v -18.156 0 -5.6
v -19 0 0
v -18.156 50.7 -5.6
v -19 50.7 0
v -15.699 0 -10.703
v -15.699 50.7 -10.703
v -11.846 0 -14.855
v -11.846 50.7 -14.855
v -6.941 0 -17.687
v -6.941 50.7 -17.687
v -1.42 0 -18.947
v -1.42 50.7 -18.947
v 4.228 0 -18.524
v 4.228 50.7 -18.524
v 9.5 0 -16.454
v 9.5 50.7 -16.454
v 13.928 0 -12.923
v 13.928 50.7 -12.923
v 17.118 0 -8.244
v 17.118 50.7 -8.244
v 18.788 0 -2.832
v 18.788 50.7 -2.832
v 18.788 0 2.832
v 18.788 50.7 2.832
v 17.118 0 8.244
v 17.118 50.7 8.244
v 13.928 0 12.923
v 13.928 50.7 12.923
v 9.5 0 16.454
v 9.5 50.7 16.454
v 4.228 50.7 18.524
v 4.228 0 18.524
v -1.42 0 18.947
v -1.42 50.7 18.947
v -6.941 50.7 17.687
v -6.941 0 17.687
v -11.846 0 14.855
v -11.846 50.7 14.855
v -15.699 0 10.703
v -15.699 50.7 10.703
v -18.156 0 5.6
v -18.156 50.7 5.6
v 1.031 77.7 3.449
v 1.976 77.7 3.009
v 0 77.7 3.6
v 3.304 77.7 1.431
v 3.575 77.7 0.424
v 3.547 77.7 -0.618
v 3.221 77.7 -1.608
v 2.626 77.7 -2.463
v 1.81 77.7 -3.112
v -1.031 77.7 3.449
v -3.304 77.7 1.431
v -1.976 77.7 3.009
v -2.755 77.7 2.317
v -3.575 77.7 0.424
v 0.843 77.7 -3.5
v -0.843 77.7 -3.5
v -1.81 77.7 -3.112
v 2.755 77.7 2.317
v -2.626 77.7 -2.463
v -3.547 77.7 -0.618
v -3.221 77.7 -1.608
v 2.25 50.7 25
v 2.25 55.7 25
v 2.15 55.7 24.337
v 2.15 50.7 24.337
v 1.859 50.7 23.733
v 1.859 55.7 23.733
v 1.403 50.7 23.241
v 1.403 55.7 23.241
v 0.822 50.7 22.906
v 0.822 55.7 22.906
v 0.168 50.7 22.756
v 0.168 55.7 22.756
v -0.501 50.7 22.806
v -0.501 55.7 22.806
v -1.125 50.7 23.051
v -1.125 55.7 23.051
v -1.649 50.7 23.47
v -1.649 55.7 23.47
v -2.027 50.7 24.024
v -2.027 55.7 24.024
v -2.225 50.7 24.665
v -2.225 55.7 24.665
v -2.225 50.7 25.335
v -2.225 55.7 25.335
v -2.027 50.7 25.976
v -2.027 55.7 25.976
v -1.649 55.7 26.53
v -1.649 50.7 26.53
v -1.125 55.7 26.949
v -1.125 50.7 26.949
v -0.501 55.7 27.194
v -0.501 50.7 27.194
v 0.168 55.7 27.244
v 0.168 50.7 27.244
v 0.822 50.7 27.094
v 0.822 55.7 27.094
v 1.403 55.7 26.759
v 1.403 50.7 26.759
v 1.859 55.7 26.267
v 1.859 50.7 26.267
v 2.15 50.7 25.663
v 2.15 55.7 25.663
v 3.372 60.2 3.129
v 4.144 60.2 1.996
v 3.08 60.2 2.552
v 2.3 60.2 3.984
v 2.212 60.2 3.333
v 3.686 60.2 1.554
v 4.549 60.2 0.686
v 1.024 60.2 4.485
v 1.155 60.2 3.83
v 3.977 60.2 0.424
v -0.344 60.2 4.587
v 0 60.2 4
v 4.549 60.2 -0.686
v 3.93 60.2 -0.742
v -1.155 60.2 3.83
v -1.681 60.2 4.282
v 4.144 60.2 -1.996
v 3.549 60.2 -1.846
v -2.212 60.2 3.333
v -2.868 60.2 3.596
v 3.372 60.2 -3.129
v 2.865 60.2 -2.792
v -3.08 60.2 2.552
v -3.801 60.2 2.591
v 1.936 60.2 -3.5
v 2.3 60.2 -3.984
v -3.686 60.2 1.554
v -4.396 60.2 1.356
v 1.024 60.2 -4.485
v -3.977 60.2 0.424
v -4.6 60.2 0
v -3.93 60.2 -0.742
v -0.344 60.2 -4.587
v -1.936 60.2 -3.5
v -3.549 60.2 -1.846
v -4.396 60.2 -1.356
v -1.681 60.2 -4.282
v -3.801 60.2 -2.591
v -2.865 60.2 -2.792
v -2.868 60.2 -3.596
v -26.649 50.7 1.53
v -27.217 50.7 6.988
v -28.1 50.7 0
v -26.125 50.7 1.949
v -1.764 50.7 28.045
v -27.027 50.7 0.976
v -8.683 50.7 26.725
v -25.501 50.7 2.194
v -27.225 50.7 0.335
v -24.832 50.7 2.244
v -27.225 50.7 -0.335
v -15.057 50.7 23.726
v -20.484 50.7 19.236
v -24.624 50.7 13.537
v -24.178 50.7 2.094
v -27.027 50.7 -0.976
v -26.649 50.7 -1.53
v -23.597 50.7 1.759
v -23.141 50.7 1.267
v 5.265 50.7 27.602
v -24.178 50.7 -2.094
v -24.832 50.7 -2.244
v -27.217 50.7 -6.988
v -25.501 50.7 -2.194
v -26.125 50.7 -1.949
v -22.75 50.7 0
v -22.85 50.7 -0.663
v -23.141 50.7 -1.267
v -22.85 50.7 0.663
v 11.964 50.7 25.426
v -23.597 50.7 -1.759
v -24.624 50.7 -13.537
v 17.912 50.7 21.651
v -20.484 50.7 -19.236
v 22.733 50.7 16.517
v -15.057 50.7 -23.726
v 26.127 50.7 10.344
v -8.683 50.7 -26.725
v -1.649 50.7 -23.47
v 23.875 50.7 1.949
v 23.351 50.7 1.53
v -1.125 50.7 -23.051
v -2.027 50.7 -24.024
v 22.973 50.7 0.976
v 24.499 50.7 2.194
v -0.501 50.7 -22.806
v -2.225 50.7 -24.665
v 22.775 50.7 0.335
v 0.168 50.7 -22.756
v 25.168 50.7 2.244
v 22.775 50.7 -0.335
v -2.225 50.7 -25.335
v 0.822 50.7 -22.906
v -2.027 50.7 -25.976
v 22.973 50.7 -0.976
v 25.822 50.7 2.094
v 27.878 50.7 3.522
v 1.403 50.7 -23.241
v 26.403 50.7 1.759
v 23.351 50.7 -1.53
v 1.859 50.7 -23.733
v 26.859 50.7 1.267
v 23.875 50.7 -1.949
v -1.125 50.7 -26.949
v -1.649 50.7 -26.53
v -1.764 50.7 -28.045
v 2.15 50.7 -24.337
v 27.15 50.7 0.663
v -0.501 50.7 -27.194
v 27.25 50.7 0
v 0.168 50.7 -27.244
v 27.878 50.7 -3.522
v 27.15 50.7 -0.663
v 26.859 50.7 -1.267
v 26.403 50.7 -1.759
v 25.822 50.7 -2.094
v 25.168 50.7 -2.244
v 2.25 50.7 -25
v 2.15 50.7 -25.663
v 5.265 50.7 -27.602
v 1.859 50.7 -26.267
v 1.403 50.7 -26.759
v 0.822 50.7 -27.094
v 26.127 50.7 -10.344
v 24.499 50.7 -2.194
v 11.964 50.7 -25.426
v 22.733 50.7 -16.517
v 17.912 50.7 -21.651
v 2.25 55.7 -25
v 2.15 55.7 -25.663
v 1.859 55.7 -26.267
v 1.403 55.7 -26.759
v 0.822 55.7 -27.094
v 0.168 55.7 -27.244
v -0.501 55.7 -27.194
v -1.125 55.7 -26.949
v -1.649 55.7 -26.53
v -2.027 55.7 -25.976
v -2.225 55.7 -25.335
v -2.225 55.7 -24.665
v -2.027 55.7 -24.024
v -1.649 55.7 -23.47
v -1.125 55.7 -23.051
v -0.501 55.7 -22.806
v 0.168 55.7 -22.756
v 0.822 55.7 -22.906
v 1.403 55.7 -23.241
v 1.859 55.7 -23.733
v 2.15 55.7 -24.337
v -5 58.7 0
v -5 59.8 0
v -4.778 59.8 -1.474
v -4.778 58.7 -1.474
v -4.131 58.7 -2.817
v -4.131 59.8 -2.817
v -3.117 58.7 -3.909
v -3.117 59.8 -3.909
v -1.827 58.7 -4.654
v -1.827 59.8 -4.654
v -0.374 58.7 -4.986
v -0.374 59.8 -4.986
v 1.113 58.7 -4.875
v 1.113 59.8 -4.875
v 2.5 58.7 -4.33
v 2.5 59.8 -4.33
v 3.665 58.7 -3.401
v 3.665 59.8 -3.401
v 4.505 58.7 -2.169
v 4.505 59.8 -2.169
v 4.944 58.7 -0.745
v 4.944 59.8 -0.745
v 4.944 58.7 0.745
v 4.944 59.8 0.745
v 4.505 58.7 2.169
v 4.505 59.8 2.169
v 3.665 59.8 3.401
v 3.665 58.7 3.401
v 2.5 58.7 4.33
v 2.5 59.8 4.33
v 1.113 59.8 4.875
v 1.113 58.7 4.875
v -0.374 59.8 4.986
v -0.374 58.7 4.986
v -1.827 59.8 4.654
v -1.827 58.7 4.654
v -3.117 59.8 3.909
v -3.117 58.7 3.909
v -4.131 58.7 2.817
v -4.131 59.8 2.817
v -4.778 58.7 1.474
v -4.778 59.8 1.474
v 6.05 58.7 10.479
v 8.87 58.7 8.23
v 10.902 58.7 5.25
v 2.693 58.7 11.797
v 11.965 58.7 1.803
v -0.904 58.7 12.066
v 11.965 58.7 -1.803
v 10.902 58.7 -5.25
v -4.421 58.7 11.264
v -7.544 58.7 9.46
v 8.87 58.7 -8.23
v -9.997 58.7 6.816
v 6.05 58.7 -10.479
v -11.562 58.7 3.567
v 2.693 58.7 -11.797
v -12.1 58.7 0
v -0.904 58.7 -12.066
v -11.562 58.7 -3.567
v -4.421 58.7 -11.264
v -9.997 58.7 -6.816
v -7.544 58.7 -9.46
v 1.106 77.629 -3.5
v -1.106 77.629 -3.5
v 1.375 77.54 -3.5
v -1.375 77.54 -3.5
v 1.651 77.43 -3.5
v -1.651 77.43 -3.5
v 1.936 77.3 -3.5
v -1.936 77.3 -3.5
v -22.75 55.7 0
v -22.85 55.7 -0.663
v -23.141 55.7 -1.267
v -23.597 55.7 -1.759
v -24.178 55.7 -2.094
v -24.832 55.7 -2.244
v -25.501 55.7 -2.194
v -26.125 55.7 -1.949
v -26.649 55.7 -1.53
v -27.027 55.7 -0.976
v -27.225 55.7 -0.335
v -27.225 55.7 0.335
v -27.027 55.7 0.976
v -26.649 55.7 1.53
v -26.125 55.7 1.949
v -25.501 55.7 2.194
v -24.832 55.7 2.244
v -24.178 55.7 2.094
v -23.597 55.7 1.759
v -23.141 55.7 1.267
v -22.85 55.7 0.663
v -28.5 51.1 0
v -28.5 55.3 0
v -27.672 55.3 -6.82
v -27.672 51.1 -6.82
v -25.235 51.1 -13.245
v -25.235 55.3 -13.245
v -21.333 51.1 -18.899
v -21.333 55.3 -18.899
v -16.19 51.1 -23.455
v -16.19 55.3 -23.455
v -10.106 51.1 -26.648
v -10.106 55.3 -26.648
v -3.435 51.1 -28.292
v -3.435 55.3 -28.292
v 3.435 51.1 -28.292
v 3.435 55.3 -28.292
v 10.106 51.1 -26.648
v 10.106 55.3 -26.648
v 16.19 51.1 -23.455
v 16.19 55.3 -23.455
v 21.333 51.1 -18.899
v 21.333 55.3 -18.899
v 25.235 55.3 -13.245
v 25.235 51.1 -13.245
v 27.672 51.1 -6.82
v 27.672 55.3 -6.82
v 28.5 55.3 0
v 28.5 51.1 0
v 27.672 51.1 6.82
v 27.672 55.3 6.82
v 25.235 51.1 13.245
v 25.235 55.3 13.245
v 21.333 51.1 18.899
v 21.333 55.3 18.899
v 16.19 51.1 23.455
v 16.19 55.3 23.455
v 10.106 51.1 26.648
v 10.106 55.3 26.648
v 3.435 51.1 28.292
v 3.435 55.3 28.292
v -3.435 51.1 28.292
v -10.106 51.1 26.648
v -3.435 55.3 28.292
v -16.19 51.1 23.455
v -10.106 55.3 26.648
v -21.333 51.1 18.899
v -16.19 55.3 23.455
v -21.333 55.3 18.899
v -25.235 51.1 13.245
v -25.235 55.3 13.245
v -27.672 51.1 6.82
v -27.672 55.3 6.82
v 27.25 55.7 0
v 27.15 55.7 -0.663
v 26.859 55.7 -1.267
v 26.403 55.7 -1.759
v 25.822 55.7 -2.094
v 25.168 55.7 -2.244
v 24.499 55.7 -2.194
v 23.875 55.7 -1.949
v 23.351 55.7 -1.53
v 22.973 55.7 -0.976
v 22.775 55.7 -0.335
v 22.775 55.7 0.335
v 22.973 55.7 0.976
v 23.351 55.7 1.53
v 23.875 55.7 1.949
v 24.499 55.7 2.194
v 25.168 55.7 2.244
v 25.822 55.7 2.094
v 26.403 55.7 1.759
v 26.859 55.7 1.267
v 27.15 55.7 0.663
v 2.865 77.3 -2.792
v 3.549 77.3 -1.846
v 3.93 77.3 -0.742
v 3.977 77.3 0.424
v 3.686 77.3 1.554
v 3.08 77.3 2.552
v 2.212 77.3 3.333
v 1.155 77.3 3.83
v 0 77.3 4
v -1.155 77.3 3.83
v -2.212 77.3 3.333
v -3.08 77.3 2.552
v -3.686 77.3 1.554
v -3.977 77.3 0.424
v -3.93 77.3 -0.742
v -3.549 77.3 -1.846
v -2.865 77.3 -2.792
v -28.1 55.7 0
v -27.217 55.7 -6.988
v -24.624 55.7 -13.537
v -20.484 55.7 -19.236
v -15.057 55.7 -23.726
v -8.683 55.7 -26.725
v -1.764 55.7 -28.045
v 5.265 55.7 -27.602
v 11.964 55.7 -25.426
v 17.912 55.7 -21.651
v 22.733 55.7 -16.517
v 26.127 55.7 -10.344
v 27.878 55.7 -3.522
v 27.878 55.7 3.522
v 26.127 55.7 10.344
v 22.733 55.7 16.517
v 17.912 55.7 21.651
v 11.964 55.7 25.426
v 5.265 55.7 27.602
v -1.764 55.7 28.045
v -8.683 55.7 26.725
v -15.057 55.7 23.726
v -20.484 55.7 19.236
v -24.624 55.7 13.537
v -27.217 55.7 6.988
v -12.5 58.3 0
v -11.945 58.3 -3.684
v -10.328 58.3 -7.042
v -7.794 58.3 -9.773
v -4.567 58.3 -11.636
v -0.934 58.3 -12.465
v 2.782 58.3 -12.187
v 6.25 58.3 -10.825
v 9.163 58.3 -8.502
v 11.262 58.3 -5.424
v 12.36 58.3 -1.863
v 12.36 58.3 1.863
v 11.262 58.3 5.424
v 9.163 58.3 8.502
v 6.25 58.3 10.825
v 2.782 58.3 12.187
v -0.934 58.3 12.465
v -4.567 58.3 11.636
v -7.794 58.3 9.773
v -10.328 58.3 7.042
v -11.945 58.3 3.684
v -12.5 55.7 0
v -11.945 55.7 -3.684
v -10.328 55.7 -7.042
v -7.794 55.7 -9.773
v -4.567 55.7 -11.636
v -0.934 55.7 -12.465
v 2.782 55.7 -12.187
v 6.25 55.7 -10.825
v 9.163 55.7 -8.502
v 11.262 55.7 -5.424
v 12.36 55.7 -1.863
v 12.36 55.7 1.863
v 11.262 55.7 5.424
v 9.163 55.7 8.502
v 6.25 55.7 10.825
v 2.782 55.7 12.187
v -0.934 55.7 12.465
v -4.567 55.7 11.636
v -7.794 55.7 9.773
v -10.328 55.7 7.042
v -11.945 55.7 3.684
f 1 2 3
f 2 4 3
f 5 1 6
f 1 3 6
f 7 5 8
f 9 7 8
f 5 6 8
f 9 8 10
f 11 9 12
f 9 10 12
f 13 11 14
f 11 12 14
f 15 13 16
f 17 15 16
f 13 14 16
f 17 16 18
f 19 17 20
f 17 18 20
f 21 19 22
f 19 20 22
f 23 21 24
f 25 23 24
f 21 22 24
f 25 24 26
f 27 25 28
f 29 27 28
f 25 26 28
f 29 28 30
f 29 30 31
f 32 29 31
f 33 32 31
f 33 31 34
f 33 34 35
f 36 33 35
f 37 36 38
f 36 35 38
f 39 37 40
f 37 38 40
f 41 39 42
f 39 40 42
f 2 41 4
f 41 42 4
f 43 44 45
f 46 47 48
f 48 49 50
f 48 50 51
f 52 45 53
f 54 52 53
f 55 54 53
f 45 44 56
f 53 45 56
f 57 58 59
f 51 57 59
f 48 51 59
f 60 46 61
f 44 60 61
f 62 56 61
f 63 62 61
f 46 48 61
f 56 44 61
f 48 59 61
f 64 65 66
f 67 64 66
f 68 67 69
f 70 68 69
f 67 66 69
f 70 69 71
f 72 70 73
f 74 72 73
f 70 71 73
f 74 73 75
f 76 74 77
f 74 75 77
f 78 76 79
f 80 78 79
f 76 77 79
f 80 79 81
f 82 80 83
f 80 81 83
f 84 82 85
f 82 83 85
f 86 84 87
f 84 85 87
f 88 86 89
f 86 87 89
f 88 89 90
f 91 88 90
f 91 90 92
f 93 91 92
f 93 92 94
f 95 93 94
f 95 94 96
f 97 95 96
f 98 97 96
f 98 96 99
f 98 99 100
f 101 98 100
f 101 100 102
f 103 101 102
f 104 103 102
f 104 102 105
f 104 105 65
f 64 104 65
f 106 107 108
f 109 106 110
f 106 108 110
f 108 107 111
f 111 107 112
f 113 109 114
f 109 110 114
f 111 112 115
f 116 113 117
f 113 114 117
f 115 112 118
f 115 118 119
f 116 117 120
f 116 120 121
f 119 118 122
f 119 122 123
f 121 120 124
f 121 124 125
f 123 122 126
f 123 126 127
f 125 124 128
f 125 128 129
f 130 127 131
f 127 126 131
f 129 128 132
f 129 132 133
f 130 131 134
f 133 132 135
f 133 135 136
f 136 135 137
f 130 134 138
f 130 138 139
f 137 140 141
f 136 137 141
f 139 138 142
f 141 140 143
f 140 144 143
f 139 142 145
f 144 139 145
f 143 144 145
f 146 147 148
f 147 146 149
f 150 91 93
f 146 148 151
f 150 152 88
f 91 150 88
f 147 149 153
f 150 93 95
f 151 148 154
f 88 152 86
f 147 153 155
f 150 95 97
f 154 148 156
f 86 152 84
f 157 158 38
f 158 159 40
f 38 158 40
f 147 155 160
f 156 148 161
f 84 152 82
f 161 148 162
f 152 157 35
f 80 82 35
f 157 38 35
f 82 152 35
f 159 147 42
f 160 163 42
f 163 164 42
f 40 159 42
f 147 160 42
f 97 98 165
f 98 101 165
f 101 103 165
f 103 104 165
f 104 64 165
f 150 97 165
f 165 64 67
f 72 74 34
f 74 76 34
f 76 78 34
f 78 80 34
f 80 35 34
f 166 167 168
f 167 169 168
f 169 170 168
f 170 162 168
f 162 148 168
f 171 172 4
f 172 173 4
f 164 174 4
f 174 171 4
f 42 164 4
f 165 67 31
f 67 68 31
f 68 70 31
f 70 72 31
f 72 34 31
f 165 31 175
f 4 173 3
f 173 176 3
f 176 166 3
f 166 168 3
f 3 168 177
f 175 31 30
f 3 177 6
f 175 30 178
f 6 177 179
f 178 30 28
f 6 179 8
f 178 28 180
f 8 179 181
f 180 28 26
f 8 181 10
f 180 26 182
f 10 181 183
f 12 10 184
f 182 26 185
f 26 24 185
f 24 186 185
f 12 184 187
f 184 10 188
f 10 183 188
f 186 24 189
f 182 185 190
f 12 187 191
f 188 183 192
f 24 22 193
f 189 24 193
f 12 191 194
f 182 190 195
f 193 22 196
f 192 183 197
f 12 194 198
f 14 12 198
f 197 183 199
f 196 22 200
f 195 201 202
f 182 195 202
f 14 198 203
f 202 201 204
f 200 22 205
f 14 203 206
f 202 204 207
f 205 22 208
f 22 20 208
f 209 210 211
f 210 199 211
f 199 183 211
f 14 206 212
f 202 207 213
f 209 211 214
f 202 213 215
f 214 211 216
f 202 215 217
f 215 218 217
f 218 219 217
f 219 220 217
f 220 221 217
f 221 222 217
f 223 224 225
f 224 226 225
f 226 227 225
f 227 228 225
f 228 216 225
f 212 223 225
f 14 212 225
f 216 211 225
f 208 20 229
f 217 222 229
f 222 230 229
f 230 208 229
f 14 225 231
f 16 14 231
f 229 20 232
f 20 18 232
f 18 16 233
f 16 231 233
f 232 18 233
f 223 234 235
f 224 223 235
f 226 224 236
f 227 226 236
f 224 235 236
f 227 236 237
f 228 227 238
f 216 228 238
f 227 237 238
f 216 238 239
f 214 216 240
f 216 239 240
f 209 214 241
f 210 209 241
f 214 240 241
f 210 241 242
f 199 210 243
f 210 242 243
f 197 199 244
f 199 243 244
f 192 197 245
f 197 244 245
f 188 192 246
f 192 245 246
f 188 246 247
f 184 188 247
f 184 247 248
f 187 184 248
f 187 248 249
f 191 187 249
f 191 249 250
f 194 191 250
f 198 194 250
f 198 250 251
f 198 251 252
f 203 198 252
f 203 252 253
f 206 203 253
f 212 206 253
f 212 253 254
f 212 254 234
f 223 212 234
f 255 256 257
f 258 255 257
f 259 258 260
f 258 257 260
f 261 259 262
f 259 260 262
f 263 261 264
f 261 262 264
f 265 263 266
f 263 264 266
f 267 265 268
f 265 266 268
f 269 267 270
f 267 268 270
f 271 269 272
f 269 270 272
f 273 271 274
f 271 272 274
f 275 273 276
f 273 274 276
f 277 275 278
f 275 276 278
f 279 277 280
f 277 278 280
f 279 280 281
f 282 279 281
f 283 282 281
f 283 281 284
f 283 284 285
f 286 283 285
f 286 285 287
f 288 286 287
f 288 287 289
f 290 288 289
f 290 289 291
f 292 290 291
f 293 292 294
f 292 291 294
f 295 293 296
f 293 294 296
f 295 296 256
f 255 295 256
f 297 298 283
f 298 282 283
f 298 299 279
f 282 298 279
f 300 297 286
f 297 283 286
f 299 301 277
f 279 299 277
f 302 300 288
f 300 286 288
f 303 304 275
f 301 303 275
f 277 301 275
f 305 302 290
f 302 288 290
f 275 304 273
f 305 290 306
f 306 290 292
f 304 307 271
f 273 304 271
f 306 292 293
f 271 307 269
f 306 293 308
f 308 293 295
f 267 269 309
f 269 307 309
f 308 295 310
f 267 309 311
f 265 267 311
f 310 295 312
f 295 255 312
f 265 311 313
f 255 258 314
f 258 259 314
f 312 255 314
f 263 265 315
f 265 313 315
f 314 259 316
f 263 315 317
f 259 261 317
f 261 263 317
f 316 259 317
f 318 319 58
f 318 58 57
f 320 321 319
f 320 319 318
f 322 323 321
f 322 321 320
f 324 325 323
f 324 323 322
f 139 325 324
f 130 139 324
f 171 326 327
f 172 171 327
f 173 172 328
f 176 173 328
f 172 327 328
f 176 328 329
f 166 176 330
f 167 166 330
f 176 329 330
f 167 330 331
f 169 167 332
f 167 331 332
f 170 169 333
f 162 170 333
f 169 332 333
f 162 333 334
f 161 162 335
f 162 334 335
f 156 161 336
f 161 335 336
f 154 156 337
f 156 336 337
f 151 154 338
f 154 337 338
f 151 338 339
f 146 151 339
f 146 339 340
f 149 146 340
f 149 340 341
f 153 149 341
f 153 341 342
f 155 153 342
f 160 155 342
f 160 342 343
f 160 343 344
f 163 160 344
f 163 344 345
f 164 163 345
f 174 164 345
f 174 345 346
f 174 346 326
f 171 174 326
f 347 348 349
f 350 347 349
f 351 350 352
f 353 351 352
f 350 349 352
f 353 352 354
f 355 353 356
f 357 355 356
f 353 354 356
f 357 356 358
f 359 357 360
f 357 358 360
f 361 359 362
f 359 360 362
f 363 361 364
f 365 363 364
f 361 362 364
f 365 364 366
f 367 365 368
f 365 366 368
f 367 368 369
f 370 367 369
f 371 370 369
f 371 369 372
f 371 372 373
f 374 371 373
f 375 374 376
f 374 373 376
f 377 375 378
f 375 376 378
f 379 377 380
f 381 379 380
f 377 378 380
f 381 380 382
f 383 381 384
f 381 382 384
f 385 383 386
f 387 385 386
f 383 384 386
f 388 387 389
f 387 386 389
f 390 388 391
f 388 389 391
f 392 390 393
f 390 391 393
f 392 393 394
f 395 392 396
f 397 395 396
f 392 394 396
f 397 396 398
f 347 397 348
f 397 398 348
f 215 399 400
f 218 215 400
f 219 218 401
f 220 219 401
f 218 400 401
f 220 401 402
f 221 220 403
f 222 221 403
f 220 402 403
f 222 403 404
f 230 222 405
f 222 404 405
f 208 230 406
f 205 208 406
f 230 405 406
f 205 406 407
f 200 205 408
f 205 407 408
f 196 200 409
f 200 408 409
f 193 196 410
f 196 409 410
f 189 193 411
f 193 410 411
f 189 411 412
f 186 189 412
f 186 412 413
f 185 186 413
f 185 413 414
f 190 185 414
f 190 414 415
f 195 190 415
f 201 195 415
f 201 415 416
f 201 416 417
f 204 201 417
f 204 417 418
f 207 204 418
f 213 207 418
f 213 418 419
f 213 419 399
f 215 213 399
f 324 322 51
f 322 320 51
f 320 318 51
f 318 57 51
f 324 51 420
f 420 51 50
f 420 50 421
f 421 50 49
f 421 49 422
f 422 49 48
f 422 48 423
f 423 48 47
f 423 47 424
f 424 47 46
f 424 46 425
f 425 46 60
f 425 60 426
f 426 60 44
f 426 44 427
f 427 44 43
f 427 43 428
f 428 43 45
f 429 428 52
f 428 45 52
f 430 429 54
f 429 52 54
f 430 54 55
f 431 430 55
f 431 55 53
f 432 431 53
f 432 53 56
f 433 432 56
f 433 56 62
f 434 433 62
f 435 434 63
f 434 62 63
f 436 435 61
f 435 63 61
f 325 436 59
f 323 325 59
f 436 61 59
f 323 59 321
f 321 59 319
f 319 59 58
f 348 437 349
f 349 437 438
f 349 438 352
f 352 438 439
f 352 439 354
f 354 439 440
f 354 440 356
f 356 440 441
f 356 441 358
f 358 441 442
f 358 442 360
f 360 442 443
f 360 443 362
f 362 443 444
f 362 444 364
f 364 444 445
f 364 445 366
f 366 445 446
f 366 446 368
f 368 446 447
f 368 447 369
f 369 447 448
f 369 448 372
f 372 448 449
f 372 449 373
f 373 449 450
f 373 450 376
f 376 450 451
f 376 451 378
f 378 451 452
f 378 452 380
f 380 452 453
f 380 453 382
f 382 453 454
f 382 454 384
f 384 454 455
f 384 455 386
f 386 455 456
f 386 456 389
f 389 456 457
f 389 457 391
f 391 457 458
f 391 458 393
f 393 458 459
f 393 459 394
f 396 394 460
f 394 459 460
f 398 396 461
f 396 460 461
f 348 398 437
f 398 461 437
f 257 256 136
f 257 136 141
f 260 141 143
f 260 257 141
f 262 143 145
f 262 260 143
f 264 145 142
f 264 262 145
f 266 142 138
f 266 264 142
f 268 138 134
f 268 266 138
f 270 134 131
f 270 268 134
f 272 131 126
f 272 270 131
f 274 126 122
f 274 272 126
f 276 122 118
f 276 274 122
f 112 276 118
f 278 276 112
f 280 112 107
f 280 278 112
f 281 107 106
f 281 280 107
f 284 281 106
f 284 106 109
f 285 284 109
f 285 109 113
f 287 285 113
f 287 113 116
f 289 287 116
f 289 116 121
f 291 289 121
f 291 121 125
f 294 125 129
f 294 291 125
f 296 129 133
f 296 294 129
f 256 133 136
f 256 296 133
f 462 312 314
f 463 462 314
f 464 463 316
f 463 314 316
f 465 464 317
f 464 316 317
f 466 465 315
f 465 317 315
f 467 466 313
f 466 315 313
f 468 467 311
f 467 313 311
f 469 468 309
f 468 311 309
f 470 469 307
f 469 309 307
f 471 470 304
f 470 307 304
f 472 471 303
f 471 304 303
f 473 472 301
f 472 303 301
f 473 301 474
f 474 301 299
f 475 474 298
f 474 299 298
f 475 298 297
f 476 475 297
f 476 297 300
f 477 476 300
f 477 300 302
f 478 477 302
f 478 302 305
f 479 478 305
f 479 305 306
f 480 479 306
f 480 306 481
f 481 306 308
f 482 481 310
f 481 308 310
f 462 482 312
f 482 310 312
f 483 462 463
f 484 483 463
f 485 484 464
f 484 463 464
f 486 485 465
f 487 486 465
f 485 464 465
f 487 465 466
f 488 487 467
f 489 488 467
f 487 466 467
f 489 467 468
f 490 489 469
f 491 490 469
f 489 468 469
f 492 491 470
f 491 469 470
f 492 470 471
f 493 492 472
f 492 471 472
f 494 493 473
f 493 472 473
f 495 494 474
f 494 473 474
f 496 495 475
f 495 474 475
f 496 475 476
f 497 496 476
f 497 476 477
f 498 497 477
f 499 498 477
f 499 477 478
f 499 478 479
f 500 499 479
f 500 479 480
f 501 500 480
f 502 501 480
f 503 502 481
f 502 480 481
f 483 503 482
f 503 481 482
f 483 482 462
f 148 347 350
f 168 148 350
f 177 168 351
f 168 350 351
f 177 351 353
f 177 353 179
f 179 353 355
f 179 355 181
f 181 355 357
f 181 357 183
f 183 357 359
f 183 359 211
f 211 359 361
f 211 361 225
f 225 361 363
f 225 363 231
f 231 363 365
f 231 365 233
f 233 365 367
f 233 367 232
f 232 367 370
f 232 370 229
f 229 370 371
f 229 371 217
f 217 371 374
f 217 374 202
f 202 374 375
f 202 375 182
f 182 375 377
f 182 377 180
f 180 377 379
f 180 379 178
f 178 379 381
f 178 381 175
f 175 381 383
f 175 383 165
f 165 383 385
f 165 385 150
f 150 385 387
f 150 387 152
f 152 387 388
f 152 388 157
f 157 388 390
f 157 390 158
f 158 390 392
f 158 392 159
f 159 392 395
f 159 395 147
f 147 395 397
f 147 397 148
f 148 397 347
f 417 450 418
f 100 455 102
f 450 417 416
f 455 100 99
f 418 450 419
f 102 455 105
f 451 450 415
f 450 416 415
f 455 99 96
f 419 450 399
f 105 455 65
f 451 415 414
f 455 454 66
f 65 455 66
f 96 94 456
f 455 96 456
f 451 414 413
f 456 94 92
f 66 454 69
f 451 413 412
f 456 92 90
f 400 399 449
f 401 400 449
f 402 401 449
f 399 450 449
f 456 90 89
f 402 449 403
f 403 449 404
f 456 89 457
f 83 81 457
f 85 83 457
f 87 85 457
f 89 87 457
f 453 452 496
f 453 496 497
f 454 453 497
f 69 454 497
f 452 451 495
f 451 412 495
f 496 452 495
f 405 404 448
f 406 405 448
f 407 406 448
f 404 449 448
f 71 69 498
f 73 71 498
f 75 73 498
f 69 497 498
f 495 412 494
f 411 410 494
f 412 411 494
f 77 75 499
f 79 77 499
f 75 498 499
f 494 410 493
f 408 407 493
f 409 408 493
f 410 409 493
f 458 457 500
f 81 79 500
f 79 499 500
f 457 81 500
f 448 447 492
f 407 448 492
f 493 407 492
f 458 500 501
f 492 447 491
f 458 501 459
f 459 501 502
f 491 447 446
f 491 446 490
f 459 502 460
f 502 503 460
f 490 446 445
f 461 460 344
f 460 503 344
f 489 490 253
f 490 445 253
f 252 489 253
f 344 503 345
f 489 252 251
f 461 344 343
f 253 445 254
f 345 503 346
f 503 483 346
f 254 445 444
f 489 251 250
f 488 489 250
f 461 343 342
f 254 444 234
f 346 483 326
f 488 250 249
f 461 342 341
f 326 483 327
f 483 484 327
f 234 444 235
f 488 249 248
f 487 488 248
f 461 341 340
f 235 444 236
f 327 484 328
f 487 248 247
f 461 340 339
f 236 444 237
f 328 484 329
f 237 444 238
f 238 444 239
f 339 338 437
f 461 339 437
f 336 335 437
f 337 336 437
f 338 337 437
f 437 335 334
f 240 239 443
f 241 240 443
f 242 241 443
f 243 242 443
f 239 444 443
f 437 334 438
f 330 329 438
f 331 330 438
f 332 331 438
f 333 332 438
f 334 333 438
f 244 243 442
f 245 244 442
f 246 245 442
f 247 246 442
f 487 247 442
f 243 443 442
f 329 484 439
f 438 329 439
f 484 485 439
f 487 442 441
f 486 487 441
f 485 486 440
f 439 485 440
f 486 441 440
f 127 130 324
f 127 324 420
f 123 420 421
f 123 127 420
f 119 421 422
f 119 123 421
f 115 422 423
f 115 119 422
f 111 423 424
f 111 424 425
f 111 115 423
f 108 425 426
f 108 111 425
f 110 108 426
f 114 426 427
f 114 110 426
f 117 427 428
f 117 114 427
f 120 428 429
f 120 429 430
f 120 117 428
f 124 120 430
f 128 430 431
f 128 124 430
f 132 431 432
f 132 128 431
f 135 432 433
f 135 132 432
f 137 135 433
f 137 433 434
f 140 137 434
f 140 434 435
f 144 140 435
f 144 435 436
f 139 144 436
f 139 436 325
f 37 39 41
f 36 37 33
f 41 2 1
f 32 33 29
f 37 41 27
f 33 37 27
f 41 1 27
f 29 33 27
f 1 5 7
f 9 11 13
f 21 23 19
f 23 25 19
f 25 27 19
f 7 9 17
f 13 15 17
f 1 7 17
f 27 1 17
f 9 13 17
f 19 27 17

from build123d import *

# Parameters (mm, degrees)
BOSS_EXTRUDE1_DEPTH = 17.5
SKETCH3_R           = 2.25
CUT_EXTRUDE1_DEPTH  = 56.7
CHAMFER1_SIZE       = 0.4
CHAMFER2_SIZE       = 0.4
CHAMFER3_SIZE       = 0.4


with BuildPart() as part:
    # Sketch1 → Revolve1 (revolve)
    with BuildSketch(Plane.XY):
        Polygon((0, 0), (-19, 0), (-19, 50.7), (-28.5, 50.7), (-28.5, 55.7), (-12.5, 55.7), (-12.5, 58.7), (-5, 58.7), (-5, 60.2), (0, 60.2), align=None)
    revolve(axis=Axis((0, 60.2, 0), (0, -1, 0)))

    # Sketch2 → Boss-Extrude1 (add)
    with BuildSketch(Plane(origin=(0, 60.2, 0), x_dir=(1, 0, 0), z_dir=(0, 1, 0))):
        with BuildLine():
            Line((-1.936491673, 3.5), (1.936491673, 3.5))
            ThreePointArc((1.936491673, 3.5), (0, -4), (-1.936491673, 3.5))
        make_face()
    extrude(amount=BOSS_EXTRUDE1_DEPTH)

    # Sketch3 → Cut-Extrude1 (cut, through all)
    with BuildSketch(Plane(origin=(0, 55.7, 0), x_dir=(1, 0, 0), z_dir=(0, 1, 0))):
        with Locations((-25, 0)):
            Circle(SKETCH3_R)
        with Locations((0, 25)):
            Circle(SKETCH3_R)
        with Locations((25, 0)):
            Circle(SKETCH3_R)
        with Locations((0, -25)):
            Circle(SKETCH3_R)
    extrude(amount=-CUT_EXTRUDE1_DEPTH, mode=Mode.SUBTRACT)

    # Chamfer1
    chamfer1_edges = [part.edges().sort_by_distance(p)[0] for p in [
        (28.5, 55.7, 0),
        (28.5, 50.7, 0),
        (12.5, 58.7, 0),
    ]]
    chamfer(chamfer1_edges, length=CHAMFER1_SIZE)

    # Chamfer2
    chamfer2_edges = [part.edges().sort_by_distance(p)[0] for p in [
        (0, 77.7, 4),
    ]]
    chamfer(chamfer2_edges, length=CHAMFER2_SIZE)

    # Chamfer3
    chamfer3_edges = [part.edges().sort_by_distance(p)[0] for p in [
        (5, 60.2, 0),
    ]]
    chamfer(chamfer3_edges, length=CHAMFER3_SIZE)


solid = part.part
